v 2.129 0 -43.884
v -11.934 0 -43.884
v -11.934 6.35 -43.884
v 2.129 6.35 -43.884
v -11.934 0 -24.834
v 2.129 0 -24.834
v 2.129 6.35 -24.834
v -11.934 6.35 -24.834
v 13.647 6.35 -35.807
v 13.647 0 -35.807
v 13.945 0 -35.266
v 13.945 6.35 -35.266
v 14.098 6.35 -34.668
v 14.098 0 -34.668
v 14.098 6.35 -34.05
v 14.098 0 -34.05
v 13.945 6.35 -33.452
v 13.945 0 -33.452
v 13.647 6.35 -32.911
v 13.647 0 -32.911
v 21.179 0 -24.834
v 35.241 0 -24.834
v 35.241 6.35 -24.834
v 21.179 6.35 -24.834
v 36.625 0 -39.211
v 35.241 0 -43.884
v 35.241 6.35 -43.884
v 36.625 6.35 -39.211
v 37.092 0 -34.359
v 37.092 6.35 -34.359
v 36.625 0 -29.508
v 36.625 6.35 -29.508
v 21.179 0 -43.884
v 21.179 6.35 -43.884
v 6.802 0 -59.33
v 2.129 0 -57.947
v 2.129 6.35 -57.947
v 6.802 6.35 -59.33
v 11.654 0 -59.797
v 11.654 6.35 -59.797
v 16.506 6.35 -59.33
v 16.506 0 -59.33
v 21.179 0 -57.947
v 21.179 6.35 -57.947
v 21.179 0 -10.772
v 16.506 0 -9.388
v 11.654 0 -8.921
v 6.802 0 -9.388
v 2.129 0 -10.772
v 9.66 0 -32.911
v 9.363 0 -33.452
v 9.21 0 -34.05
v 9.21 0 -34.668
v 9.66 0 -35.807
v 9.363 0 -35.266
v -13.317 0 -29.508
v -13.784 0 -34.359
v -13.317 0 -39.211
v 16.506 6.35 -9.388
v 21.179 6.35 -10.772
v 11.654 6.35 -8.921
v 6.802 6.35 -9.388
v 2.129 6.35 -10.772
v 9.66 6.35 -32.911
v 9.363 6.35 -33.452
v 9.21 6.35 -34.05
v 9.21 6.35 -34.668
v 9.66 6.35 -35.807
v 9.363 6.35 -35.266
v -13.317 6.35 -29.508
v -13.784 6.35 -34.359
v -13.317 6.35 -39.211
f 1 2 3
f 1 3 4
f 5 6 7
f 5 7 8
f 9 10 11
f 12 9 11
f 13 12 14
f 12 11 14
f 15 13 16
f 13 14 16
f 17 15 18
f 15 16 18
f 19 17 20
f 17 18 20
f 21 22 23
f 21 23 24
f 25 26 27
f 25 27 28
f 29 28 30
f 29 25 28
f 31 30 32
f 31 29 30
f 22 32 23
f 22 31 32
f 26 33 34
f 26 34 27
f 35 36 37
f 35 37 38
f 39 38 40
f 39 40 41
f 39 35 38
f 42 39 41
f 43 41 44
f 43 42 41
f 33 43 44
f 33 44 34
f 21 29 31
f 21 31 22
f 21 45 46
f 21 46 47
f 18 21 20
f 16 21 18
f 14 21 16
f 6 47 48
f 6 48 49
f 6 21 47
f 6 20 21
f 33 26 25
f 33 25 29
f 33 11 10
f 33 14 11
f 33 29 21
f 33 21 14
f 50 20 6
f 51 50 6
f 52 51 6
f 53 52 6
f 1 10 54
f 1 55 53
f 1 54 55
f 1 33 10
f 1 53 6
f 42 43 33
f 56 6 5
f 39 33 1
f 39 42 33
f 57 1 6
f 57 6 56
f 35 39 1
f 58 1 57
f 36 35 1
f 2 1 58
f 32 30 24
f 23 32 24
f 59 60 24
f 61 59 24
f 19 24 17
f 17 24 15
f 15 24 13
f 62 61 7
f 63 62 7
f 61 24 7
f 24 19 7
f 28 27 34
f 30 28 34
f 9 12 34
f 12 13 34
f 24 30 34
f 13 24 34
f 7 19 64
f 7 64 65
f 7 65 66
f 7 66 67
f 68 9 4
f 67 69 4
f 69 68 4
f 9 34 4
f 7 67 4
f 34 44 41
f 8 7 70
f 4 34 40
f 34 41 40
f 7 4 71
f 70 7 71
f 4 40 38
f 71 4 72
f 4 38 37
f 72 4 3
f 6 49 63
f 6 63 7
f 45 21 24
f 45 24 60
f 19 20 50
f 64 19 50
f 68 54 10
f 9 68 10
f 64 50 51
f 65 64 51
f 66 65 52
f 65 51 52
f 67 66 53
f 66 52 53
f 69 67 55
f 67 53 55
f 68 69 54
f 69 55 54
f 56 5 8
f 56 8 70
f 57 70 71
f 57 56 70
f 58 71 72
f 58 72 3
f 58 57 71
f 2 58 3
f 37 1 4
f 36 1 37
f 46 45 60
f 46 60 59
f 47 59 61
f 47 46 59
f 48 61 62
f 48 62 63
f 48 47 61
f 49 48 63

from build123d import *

# Parameters (mm, degrees)
BOSS_EXTRUDE1_DEPTH = 6.35


with BuildPart() as part:
    # Sketch1 → Boss-Extrude1 (new body)
    with BuildSketch(Plane(origin=(0, 0, 0), x_dir=(1, 0, 0), z_dir=(0, 1, 0))):
        with BuildLine():
            Line((2.128963531, 43.884099376), (2.128963531, 57.94662376))
            ThreePointArc((2.128963531, 57.94662376), (11.653963531, 59.797199376), (21.178963531, 57.94662376))
            Line((21.178963531, 57.94662376), (21.178963531, 43.884099376))
            Line((21.178963531, 43.884099376), (35.241487916, 43.884099376))
            ThreePointArc((35.241487916, 43.884099376), (37.092063531, 34.359099376), (35.241487916, 24.834099376))
            Line((35.241487916, 24.834099376), (21.178963531, 24.834099376))
            Line((21.178963531, 24.834099376), (21.178963531, 10.771574991))
            ThreePointArc((21.178963531, 10.771574991), (11.653963531, 8.920999376), (2.128963531, 10.771574991))
            Line((2.128963531, 10.771574991), (2.128963531, 24.834099376))
            Line((2.128963531, 24.834099376), (-11.933560854, 24.834099376))
            ThreePointArc((-11.933560854, 24.834099376), (-13.784136469, 34.359099376), (-11.933560854, 43.884099376))
            Line((-11.933560854, 43.884099376), (2.128963531, 43.884099376))
        make_face()
        with BuildLine():
            Line((11.653963531, 35.806899376), (13.647499485, 35.806899376))
            ThreePointArc((13.647499485, 35.806899376), (14.117763531, 34.359099376), (13.647499485, 32.911299376))
            Line((13.647499485, 32.911299376), (11.653963531, 32.911299376))
            Line((11.653963531, 32.911299376), (9.660427577, 32.911299376))
            ThreePointArc((9.660427577, 32.911299376), (9.190163531, 34.359099376), (9.660427577, 35.806899376))
            Line((9.660427577, 35.806899376), (11.653963531, 35.806899376))
        make_face(mode=Mode.SUBTRACT)
    extrude(amount=BOSS_EXTRUDE1_DEPTH)


solid = part.part
